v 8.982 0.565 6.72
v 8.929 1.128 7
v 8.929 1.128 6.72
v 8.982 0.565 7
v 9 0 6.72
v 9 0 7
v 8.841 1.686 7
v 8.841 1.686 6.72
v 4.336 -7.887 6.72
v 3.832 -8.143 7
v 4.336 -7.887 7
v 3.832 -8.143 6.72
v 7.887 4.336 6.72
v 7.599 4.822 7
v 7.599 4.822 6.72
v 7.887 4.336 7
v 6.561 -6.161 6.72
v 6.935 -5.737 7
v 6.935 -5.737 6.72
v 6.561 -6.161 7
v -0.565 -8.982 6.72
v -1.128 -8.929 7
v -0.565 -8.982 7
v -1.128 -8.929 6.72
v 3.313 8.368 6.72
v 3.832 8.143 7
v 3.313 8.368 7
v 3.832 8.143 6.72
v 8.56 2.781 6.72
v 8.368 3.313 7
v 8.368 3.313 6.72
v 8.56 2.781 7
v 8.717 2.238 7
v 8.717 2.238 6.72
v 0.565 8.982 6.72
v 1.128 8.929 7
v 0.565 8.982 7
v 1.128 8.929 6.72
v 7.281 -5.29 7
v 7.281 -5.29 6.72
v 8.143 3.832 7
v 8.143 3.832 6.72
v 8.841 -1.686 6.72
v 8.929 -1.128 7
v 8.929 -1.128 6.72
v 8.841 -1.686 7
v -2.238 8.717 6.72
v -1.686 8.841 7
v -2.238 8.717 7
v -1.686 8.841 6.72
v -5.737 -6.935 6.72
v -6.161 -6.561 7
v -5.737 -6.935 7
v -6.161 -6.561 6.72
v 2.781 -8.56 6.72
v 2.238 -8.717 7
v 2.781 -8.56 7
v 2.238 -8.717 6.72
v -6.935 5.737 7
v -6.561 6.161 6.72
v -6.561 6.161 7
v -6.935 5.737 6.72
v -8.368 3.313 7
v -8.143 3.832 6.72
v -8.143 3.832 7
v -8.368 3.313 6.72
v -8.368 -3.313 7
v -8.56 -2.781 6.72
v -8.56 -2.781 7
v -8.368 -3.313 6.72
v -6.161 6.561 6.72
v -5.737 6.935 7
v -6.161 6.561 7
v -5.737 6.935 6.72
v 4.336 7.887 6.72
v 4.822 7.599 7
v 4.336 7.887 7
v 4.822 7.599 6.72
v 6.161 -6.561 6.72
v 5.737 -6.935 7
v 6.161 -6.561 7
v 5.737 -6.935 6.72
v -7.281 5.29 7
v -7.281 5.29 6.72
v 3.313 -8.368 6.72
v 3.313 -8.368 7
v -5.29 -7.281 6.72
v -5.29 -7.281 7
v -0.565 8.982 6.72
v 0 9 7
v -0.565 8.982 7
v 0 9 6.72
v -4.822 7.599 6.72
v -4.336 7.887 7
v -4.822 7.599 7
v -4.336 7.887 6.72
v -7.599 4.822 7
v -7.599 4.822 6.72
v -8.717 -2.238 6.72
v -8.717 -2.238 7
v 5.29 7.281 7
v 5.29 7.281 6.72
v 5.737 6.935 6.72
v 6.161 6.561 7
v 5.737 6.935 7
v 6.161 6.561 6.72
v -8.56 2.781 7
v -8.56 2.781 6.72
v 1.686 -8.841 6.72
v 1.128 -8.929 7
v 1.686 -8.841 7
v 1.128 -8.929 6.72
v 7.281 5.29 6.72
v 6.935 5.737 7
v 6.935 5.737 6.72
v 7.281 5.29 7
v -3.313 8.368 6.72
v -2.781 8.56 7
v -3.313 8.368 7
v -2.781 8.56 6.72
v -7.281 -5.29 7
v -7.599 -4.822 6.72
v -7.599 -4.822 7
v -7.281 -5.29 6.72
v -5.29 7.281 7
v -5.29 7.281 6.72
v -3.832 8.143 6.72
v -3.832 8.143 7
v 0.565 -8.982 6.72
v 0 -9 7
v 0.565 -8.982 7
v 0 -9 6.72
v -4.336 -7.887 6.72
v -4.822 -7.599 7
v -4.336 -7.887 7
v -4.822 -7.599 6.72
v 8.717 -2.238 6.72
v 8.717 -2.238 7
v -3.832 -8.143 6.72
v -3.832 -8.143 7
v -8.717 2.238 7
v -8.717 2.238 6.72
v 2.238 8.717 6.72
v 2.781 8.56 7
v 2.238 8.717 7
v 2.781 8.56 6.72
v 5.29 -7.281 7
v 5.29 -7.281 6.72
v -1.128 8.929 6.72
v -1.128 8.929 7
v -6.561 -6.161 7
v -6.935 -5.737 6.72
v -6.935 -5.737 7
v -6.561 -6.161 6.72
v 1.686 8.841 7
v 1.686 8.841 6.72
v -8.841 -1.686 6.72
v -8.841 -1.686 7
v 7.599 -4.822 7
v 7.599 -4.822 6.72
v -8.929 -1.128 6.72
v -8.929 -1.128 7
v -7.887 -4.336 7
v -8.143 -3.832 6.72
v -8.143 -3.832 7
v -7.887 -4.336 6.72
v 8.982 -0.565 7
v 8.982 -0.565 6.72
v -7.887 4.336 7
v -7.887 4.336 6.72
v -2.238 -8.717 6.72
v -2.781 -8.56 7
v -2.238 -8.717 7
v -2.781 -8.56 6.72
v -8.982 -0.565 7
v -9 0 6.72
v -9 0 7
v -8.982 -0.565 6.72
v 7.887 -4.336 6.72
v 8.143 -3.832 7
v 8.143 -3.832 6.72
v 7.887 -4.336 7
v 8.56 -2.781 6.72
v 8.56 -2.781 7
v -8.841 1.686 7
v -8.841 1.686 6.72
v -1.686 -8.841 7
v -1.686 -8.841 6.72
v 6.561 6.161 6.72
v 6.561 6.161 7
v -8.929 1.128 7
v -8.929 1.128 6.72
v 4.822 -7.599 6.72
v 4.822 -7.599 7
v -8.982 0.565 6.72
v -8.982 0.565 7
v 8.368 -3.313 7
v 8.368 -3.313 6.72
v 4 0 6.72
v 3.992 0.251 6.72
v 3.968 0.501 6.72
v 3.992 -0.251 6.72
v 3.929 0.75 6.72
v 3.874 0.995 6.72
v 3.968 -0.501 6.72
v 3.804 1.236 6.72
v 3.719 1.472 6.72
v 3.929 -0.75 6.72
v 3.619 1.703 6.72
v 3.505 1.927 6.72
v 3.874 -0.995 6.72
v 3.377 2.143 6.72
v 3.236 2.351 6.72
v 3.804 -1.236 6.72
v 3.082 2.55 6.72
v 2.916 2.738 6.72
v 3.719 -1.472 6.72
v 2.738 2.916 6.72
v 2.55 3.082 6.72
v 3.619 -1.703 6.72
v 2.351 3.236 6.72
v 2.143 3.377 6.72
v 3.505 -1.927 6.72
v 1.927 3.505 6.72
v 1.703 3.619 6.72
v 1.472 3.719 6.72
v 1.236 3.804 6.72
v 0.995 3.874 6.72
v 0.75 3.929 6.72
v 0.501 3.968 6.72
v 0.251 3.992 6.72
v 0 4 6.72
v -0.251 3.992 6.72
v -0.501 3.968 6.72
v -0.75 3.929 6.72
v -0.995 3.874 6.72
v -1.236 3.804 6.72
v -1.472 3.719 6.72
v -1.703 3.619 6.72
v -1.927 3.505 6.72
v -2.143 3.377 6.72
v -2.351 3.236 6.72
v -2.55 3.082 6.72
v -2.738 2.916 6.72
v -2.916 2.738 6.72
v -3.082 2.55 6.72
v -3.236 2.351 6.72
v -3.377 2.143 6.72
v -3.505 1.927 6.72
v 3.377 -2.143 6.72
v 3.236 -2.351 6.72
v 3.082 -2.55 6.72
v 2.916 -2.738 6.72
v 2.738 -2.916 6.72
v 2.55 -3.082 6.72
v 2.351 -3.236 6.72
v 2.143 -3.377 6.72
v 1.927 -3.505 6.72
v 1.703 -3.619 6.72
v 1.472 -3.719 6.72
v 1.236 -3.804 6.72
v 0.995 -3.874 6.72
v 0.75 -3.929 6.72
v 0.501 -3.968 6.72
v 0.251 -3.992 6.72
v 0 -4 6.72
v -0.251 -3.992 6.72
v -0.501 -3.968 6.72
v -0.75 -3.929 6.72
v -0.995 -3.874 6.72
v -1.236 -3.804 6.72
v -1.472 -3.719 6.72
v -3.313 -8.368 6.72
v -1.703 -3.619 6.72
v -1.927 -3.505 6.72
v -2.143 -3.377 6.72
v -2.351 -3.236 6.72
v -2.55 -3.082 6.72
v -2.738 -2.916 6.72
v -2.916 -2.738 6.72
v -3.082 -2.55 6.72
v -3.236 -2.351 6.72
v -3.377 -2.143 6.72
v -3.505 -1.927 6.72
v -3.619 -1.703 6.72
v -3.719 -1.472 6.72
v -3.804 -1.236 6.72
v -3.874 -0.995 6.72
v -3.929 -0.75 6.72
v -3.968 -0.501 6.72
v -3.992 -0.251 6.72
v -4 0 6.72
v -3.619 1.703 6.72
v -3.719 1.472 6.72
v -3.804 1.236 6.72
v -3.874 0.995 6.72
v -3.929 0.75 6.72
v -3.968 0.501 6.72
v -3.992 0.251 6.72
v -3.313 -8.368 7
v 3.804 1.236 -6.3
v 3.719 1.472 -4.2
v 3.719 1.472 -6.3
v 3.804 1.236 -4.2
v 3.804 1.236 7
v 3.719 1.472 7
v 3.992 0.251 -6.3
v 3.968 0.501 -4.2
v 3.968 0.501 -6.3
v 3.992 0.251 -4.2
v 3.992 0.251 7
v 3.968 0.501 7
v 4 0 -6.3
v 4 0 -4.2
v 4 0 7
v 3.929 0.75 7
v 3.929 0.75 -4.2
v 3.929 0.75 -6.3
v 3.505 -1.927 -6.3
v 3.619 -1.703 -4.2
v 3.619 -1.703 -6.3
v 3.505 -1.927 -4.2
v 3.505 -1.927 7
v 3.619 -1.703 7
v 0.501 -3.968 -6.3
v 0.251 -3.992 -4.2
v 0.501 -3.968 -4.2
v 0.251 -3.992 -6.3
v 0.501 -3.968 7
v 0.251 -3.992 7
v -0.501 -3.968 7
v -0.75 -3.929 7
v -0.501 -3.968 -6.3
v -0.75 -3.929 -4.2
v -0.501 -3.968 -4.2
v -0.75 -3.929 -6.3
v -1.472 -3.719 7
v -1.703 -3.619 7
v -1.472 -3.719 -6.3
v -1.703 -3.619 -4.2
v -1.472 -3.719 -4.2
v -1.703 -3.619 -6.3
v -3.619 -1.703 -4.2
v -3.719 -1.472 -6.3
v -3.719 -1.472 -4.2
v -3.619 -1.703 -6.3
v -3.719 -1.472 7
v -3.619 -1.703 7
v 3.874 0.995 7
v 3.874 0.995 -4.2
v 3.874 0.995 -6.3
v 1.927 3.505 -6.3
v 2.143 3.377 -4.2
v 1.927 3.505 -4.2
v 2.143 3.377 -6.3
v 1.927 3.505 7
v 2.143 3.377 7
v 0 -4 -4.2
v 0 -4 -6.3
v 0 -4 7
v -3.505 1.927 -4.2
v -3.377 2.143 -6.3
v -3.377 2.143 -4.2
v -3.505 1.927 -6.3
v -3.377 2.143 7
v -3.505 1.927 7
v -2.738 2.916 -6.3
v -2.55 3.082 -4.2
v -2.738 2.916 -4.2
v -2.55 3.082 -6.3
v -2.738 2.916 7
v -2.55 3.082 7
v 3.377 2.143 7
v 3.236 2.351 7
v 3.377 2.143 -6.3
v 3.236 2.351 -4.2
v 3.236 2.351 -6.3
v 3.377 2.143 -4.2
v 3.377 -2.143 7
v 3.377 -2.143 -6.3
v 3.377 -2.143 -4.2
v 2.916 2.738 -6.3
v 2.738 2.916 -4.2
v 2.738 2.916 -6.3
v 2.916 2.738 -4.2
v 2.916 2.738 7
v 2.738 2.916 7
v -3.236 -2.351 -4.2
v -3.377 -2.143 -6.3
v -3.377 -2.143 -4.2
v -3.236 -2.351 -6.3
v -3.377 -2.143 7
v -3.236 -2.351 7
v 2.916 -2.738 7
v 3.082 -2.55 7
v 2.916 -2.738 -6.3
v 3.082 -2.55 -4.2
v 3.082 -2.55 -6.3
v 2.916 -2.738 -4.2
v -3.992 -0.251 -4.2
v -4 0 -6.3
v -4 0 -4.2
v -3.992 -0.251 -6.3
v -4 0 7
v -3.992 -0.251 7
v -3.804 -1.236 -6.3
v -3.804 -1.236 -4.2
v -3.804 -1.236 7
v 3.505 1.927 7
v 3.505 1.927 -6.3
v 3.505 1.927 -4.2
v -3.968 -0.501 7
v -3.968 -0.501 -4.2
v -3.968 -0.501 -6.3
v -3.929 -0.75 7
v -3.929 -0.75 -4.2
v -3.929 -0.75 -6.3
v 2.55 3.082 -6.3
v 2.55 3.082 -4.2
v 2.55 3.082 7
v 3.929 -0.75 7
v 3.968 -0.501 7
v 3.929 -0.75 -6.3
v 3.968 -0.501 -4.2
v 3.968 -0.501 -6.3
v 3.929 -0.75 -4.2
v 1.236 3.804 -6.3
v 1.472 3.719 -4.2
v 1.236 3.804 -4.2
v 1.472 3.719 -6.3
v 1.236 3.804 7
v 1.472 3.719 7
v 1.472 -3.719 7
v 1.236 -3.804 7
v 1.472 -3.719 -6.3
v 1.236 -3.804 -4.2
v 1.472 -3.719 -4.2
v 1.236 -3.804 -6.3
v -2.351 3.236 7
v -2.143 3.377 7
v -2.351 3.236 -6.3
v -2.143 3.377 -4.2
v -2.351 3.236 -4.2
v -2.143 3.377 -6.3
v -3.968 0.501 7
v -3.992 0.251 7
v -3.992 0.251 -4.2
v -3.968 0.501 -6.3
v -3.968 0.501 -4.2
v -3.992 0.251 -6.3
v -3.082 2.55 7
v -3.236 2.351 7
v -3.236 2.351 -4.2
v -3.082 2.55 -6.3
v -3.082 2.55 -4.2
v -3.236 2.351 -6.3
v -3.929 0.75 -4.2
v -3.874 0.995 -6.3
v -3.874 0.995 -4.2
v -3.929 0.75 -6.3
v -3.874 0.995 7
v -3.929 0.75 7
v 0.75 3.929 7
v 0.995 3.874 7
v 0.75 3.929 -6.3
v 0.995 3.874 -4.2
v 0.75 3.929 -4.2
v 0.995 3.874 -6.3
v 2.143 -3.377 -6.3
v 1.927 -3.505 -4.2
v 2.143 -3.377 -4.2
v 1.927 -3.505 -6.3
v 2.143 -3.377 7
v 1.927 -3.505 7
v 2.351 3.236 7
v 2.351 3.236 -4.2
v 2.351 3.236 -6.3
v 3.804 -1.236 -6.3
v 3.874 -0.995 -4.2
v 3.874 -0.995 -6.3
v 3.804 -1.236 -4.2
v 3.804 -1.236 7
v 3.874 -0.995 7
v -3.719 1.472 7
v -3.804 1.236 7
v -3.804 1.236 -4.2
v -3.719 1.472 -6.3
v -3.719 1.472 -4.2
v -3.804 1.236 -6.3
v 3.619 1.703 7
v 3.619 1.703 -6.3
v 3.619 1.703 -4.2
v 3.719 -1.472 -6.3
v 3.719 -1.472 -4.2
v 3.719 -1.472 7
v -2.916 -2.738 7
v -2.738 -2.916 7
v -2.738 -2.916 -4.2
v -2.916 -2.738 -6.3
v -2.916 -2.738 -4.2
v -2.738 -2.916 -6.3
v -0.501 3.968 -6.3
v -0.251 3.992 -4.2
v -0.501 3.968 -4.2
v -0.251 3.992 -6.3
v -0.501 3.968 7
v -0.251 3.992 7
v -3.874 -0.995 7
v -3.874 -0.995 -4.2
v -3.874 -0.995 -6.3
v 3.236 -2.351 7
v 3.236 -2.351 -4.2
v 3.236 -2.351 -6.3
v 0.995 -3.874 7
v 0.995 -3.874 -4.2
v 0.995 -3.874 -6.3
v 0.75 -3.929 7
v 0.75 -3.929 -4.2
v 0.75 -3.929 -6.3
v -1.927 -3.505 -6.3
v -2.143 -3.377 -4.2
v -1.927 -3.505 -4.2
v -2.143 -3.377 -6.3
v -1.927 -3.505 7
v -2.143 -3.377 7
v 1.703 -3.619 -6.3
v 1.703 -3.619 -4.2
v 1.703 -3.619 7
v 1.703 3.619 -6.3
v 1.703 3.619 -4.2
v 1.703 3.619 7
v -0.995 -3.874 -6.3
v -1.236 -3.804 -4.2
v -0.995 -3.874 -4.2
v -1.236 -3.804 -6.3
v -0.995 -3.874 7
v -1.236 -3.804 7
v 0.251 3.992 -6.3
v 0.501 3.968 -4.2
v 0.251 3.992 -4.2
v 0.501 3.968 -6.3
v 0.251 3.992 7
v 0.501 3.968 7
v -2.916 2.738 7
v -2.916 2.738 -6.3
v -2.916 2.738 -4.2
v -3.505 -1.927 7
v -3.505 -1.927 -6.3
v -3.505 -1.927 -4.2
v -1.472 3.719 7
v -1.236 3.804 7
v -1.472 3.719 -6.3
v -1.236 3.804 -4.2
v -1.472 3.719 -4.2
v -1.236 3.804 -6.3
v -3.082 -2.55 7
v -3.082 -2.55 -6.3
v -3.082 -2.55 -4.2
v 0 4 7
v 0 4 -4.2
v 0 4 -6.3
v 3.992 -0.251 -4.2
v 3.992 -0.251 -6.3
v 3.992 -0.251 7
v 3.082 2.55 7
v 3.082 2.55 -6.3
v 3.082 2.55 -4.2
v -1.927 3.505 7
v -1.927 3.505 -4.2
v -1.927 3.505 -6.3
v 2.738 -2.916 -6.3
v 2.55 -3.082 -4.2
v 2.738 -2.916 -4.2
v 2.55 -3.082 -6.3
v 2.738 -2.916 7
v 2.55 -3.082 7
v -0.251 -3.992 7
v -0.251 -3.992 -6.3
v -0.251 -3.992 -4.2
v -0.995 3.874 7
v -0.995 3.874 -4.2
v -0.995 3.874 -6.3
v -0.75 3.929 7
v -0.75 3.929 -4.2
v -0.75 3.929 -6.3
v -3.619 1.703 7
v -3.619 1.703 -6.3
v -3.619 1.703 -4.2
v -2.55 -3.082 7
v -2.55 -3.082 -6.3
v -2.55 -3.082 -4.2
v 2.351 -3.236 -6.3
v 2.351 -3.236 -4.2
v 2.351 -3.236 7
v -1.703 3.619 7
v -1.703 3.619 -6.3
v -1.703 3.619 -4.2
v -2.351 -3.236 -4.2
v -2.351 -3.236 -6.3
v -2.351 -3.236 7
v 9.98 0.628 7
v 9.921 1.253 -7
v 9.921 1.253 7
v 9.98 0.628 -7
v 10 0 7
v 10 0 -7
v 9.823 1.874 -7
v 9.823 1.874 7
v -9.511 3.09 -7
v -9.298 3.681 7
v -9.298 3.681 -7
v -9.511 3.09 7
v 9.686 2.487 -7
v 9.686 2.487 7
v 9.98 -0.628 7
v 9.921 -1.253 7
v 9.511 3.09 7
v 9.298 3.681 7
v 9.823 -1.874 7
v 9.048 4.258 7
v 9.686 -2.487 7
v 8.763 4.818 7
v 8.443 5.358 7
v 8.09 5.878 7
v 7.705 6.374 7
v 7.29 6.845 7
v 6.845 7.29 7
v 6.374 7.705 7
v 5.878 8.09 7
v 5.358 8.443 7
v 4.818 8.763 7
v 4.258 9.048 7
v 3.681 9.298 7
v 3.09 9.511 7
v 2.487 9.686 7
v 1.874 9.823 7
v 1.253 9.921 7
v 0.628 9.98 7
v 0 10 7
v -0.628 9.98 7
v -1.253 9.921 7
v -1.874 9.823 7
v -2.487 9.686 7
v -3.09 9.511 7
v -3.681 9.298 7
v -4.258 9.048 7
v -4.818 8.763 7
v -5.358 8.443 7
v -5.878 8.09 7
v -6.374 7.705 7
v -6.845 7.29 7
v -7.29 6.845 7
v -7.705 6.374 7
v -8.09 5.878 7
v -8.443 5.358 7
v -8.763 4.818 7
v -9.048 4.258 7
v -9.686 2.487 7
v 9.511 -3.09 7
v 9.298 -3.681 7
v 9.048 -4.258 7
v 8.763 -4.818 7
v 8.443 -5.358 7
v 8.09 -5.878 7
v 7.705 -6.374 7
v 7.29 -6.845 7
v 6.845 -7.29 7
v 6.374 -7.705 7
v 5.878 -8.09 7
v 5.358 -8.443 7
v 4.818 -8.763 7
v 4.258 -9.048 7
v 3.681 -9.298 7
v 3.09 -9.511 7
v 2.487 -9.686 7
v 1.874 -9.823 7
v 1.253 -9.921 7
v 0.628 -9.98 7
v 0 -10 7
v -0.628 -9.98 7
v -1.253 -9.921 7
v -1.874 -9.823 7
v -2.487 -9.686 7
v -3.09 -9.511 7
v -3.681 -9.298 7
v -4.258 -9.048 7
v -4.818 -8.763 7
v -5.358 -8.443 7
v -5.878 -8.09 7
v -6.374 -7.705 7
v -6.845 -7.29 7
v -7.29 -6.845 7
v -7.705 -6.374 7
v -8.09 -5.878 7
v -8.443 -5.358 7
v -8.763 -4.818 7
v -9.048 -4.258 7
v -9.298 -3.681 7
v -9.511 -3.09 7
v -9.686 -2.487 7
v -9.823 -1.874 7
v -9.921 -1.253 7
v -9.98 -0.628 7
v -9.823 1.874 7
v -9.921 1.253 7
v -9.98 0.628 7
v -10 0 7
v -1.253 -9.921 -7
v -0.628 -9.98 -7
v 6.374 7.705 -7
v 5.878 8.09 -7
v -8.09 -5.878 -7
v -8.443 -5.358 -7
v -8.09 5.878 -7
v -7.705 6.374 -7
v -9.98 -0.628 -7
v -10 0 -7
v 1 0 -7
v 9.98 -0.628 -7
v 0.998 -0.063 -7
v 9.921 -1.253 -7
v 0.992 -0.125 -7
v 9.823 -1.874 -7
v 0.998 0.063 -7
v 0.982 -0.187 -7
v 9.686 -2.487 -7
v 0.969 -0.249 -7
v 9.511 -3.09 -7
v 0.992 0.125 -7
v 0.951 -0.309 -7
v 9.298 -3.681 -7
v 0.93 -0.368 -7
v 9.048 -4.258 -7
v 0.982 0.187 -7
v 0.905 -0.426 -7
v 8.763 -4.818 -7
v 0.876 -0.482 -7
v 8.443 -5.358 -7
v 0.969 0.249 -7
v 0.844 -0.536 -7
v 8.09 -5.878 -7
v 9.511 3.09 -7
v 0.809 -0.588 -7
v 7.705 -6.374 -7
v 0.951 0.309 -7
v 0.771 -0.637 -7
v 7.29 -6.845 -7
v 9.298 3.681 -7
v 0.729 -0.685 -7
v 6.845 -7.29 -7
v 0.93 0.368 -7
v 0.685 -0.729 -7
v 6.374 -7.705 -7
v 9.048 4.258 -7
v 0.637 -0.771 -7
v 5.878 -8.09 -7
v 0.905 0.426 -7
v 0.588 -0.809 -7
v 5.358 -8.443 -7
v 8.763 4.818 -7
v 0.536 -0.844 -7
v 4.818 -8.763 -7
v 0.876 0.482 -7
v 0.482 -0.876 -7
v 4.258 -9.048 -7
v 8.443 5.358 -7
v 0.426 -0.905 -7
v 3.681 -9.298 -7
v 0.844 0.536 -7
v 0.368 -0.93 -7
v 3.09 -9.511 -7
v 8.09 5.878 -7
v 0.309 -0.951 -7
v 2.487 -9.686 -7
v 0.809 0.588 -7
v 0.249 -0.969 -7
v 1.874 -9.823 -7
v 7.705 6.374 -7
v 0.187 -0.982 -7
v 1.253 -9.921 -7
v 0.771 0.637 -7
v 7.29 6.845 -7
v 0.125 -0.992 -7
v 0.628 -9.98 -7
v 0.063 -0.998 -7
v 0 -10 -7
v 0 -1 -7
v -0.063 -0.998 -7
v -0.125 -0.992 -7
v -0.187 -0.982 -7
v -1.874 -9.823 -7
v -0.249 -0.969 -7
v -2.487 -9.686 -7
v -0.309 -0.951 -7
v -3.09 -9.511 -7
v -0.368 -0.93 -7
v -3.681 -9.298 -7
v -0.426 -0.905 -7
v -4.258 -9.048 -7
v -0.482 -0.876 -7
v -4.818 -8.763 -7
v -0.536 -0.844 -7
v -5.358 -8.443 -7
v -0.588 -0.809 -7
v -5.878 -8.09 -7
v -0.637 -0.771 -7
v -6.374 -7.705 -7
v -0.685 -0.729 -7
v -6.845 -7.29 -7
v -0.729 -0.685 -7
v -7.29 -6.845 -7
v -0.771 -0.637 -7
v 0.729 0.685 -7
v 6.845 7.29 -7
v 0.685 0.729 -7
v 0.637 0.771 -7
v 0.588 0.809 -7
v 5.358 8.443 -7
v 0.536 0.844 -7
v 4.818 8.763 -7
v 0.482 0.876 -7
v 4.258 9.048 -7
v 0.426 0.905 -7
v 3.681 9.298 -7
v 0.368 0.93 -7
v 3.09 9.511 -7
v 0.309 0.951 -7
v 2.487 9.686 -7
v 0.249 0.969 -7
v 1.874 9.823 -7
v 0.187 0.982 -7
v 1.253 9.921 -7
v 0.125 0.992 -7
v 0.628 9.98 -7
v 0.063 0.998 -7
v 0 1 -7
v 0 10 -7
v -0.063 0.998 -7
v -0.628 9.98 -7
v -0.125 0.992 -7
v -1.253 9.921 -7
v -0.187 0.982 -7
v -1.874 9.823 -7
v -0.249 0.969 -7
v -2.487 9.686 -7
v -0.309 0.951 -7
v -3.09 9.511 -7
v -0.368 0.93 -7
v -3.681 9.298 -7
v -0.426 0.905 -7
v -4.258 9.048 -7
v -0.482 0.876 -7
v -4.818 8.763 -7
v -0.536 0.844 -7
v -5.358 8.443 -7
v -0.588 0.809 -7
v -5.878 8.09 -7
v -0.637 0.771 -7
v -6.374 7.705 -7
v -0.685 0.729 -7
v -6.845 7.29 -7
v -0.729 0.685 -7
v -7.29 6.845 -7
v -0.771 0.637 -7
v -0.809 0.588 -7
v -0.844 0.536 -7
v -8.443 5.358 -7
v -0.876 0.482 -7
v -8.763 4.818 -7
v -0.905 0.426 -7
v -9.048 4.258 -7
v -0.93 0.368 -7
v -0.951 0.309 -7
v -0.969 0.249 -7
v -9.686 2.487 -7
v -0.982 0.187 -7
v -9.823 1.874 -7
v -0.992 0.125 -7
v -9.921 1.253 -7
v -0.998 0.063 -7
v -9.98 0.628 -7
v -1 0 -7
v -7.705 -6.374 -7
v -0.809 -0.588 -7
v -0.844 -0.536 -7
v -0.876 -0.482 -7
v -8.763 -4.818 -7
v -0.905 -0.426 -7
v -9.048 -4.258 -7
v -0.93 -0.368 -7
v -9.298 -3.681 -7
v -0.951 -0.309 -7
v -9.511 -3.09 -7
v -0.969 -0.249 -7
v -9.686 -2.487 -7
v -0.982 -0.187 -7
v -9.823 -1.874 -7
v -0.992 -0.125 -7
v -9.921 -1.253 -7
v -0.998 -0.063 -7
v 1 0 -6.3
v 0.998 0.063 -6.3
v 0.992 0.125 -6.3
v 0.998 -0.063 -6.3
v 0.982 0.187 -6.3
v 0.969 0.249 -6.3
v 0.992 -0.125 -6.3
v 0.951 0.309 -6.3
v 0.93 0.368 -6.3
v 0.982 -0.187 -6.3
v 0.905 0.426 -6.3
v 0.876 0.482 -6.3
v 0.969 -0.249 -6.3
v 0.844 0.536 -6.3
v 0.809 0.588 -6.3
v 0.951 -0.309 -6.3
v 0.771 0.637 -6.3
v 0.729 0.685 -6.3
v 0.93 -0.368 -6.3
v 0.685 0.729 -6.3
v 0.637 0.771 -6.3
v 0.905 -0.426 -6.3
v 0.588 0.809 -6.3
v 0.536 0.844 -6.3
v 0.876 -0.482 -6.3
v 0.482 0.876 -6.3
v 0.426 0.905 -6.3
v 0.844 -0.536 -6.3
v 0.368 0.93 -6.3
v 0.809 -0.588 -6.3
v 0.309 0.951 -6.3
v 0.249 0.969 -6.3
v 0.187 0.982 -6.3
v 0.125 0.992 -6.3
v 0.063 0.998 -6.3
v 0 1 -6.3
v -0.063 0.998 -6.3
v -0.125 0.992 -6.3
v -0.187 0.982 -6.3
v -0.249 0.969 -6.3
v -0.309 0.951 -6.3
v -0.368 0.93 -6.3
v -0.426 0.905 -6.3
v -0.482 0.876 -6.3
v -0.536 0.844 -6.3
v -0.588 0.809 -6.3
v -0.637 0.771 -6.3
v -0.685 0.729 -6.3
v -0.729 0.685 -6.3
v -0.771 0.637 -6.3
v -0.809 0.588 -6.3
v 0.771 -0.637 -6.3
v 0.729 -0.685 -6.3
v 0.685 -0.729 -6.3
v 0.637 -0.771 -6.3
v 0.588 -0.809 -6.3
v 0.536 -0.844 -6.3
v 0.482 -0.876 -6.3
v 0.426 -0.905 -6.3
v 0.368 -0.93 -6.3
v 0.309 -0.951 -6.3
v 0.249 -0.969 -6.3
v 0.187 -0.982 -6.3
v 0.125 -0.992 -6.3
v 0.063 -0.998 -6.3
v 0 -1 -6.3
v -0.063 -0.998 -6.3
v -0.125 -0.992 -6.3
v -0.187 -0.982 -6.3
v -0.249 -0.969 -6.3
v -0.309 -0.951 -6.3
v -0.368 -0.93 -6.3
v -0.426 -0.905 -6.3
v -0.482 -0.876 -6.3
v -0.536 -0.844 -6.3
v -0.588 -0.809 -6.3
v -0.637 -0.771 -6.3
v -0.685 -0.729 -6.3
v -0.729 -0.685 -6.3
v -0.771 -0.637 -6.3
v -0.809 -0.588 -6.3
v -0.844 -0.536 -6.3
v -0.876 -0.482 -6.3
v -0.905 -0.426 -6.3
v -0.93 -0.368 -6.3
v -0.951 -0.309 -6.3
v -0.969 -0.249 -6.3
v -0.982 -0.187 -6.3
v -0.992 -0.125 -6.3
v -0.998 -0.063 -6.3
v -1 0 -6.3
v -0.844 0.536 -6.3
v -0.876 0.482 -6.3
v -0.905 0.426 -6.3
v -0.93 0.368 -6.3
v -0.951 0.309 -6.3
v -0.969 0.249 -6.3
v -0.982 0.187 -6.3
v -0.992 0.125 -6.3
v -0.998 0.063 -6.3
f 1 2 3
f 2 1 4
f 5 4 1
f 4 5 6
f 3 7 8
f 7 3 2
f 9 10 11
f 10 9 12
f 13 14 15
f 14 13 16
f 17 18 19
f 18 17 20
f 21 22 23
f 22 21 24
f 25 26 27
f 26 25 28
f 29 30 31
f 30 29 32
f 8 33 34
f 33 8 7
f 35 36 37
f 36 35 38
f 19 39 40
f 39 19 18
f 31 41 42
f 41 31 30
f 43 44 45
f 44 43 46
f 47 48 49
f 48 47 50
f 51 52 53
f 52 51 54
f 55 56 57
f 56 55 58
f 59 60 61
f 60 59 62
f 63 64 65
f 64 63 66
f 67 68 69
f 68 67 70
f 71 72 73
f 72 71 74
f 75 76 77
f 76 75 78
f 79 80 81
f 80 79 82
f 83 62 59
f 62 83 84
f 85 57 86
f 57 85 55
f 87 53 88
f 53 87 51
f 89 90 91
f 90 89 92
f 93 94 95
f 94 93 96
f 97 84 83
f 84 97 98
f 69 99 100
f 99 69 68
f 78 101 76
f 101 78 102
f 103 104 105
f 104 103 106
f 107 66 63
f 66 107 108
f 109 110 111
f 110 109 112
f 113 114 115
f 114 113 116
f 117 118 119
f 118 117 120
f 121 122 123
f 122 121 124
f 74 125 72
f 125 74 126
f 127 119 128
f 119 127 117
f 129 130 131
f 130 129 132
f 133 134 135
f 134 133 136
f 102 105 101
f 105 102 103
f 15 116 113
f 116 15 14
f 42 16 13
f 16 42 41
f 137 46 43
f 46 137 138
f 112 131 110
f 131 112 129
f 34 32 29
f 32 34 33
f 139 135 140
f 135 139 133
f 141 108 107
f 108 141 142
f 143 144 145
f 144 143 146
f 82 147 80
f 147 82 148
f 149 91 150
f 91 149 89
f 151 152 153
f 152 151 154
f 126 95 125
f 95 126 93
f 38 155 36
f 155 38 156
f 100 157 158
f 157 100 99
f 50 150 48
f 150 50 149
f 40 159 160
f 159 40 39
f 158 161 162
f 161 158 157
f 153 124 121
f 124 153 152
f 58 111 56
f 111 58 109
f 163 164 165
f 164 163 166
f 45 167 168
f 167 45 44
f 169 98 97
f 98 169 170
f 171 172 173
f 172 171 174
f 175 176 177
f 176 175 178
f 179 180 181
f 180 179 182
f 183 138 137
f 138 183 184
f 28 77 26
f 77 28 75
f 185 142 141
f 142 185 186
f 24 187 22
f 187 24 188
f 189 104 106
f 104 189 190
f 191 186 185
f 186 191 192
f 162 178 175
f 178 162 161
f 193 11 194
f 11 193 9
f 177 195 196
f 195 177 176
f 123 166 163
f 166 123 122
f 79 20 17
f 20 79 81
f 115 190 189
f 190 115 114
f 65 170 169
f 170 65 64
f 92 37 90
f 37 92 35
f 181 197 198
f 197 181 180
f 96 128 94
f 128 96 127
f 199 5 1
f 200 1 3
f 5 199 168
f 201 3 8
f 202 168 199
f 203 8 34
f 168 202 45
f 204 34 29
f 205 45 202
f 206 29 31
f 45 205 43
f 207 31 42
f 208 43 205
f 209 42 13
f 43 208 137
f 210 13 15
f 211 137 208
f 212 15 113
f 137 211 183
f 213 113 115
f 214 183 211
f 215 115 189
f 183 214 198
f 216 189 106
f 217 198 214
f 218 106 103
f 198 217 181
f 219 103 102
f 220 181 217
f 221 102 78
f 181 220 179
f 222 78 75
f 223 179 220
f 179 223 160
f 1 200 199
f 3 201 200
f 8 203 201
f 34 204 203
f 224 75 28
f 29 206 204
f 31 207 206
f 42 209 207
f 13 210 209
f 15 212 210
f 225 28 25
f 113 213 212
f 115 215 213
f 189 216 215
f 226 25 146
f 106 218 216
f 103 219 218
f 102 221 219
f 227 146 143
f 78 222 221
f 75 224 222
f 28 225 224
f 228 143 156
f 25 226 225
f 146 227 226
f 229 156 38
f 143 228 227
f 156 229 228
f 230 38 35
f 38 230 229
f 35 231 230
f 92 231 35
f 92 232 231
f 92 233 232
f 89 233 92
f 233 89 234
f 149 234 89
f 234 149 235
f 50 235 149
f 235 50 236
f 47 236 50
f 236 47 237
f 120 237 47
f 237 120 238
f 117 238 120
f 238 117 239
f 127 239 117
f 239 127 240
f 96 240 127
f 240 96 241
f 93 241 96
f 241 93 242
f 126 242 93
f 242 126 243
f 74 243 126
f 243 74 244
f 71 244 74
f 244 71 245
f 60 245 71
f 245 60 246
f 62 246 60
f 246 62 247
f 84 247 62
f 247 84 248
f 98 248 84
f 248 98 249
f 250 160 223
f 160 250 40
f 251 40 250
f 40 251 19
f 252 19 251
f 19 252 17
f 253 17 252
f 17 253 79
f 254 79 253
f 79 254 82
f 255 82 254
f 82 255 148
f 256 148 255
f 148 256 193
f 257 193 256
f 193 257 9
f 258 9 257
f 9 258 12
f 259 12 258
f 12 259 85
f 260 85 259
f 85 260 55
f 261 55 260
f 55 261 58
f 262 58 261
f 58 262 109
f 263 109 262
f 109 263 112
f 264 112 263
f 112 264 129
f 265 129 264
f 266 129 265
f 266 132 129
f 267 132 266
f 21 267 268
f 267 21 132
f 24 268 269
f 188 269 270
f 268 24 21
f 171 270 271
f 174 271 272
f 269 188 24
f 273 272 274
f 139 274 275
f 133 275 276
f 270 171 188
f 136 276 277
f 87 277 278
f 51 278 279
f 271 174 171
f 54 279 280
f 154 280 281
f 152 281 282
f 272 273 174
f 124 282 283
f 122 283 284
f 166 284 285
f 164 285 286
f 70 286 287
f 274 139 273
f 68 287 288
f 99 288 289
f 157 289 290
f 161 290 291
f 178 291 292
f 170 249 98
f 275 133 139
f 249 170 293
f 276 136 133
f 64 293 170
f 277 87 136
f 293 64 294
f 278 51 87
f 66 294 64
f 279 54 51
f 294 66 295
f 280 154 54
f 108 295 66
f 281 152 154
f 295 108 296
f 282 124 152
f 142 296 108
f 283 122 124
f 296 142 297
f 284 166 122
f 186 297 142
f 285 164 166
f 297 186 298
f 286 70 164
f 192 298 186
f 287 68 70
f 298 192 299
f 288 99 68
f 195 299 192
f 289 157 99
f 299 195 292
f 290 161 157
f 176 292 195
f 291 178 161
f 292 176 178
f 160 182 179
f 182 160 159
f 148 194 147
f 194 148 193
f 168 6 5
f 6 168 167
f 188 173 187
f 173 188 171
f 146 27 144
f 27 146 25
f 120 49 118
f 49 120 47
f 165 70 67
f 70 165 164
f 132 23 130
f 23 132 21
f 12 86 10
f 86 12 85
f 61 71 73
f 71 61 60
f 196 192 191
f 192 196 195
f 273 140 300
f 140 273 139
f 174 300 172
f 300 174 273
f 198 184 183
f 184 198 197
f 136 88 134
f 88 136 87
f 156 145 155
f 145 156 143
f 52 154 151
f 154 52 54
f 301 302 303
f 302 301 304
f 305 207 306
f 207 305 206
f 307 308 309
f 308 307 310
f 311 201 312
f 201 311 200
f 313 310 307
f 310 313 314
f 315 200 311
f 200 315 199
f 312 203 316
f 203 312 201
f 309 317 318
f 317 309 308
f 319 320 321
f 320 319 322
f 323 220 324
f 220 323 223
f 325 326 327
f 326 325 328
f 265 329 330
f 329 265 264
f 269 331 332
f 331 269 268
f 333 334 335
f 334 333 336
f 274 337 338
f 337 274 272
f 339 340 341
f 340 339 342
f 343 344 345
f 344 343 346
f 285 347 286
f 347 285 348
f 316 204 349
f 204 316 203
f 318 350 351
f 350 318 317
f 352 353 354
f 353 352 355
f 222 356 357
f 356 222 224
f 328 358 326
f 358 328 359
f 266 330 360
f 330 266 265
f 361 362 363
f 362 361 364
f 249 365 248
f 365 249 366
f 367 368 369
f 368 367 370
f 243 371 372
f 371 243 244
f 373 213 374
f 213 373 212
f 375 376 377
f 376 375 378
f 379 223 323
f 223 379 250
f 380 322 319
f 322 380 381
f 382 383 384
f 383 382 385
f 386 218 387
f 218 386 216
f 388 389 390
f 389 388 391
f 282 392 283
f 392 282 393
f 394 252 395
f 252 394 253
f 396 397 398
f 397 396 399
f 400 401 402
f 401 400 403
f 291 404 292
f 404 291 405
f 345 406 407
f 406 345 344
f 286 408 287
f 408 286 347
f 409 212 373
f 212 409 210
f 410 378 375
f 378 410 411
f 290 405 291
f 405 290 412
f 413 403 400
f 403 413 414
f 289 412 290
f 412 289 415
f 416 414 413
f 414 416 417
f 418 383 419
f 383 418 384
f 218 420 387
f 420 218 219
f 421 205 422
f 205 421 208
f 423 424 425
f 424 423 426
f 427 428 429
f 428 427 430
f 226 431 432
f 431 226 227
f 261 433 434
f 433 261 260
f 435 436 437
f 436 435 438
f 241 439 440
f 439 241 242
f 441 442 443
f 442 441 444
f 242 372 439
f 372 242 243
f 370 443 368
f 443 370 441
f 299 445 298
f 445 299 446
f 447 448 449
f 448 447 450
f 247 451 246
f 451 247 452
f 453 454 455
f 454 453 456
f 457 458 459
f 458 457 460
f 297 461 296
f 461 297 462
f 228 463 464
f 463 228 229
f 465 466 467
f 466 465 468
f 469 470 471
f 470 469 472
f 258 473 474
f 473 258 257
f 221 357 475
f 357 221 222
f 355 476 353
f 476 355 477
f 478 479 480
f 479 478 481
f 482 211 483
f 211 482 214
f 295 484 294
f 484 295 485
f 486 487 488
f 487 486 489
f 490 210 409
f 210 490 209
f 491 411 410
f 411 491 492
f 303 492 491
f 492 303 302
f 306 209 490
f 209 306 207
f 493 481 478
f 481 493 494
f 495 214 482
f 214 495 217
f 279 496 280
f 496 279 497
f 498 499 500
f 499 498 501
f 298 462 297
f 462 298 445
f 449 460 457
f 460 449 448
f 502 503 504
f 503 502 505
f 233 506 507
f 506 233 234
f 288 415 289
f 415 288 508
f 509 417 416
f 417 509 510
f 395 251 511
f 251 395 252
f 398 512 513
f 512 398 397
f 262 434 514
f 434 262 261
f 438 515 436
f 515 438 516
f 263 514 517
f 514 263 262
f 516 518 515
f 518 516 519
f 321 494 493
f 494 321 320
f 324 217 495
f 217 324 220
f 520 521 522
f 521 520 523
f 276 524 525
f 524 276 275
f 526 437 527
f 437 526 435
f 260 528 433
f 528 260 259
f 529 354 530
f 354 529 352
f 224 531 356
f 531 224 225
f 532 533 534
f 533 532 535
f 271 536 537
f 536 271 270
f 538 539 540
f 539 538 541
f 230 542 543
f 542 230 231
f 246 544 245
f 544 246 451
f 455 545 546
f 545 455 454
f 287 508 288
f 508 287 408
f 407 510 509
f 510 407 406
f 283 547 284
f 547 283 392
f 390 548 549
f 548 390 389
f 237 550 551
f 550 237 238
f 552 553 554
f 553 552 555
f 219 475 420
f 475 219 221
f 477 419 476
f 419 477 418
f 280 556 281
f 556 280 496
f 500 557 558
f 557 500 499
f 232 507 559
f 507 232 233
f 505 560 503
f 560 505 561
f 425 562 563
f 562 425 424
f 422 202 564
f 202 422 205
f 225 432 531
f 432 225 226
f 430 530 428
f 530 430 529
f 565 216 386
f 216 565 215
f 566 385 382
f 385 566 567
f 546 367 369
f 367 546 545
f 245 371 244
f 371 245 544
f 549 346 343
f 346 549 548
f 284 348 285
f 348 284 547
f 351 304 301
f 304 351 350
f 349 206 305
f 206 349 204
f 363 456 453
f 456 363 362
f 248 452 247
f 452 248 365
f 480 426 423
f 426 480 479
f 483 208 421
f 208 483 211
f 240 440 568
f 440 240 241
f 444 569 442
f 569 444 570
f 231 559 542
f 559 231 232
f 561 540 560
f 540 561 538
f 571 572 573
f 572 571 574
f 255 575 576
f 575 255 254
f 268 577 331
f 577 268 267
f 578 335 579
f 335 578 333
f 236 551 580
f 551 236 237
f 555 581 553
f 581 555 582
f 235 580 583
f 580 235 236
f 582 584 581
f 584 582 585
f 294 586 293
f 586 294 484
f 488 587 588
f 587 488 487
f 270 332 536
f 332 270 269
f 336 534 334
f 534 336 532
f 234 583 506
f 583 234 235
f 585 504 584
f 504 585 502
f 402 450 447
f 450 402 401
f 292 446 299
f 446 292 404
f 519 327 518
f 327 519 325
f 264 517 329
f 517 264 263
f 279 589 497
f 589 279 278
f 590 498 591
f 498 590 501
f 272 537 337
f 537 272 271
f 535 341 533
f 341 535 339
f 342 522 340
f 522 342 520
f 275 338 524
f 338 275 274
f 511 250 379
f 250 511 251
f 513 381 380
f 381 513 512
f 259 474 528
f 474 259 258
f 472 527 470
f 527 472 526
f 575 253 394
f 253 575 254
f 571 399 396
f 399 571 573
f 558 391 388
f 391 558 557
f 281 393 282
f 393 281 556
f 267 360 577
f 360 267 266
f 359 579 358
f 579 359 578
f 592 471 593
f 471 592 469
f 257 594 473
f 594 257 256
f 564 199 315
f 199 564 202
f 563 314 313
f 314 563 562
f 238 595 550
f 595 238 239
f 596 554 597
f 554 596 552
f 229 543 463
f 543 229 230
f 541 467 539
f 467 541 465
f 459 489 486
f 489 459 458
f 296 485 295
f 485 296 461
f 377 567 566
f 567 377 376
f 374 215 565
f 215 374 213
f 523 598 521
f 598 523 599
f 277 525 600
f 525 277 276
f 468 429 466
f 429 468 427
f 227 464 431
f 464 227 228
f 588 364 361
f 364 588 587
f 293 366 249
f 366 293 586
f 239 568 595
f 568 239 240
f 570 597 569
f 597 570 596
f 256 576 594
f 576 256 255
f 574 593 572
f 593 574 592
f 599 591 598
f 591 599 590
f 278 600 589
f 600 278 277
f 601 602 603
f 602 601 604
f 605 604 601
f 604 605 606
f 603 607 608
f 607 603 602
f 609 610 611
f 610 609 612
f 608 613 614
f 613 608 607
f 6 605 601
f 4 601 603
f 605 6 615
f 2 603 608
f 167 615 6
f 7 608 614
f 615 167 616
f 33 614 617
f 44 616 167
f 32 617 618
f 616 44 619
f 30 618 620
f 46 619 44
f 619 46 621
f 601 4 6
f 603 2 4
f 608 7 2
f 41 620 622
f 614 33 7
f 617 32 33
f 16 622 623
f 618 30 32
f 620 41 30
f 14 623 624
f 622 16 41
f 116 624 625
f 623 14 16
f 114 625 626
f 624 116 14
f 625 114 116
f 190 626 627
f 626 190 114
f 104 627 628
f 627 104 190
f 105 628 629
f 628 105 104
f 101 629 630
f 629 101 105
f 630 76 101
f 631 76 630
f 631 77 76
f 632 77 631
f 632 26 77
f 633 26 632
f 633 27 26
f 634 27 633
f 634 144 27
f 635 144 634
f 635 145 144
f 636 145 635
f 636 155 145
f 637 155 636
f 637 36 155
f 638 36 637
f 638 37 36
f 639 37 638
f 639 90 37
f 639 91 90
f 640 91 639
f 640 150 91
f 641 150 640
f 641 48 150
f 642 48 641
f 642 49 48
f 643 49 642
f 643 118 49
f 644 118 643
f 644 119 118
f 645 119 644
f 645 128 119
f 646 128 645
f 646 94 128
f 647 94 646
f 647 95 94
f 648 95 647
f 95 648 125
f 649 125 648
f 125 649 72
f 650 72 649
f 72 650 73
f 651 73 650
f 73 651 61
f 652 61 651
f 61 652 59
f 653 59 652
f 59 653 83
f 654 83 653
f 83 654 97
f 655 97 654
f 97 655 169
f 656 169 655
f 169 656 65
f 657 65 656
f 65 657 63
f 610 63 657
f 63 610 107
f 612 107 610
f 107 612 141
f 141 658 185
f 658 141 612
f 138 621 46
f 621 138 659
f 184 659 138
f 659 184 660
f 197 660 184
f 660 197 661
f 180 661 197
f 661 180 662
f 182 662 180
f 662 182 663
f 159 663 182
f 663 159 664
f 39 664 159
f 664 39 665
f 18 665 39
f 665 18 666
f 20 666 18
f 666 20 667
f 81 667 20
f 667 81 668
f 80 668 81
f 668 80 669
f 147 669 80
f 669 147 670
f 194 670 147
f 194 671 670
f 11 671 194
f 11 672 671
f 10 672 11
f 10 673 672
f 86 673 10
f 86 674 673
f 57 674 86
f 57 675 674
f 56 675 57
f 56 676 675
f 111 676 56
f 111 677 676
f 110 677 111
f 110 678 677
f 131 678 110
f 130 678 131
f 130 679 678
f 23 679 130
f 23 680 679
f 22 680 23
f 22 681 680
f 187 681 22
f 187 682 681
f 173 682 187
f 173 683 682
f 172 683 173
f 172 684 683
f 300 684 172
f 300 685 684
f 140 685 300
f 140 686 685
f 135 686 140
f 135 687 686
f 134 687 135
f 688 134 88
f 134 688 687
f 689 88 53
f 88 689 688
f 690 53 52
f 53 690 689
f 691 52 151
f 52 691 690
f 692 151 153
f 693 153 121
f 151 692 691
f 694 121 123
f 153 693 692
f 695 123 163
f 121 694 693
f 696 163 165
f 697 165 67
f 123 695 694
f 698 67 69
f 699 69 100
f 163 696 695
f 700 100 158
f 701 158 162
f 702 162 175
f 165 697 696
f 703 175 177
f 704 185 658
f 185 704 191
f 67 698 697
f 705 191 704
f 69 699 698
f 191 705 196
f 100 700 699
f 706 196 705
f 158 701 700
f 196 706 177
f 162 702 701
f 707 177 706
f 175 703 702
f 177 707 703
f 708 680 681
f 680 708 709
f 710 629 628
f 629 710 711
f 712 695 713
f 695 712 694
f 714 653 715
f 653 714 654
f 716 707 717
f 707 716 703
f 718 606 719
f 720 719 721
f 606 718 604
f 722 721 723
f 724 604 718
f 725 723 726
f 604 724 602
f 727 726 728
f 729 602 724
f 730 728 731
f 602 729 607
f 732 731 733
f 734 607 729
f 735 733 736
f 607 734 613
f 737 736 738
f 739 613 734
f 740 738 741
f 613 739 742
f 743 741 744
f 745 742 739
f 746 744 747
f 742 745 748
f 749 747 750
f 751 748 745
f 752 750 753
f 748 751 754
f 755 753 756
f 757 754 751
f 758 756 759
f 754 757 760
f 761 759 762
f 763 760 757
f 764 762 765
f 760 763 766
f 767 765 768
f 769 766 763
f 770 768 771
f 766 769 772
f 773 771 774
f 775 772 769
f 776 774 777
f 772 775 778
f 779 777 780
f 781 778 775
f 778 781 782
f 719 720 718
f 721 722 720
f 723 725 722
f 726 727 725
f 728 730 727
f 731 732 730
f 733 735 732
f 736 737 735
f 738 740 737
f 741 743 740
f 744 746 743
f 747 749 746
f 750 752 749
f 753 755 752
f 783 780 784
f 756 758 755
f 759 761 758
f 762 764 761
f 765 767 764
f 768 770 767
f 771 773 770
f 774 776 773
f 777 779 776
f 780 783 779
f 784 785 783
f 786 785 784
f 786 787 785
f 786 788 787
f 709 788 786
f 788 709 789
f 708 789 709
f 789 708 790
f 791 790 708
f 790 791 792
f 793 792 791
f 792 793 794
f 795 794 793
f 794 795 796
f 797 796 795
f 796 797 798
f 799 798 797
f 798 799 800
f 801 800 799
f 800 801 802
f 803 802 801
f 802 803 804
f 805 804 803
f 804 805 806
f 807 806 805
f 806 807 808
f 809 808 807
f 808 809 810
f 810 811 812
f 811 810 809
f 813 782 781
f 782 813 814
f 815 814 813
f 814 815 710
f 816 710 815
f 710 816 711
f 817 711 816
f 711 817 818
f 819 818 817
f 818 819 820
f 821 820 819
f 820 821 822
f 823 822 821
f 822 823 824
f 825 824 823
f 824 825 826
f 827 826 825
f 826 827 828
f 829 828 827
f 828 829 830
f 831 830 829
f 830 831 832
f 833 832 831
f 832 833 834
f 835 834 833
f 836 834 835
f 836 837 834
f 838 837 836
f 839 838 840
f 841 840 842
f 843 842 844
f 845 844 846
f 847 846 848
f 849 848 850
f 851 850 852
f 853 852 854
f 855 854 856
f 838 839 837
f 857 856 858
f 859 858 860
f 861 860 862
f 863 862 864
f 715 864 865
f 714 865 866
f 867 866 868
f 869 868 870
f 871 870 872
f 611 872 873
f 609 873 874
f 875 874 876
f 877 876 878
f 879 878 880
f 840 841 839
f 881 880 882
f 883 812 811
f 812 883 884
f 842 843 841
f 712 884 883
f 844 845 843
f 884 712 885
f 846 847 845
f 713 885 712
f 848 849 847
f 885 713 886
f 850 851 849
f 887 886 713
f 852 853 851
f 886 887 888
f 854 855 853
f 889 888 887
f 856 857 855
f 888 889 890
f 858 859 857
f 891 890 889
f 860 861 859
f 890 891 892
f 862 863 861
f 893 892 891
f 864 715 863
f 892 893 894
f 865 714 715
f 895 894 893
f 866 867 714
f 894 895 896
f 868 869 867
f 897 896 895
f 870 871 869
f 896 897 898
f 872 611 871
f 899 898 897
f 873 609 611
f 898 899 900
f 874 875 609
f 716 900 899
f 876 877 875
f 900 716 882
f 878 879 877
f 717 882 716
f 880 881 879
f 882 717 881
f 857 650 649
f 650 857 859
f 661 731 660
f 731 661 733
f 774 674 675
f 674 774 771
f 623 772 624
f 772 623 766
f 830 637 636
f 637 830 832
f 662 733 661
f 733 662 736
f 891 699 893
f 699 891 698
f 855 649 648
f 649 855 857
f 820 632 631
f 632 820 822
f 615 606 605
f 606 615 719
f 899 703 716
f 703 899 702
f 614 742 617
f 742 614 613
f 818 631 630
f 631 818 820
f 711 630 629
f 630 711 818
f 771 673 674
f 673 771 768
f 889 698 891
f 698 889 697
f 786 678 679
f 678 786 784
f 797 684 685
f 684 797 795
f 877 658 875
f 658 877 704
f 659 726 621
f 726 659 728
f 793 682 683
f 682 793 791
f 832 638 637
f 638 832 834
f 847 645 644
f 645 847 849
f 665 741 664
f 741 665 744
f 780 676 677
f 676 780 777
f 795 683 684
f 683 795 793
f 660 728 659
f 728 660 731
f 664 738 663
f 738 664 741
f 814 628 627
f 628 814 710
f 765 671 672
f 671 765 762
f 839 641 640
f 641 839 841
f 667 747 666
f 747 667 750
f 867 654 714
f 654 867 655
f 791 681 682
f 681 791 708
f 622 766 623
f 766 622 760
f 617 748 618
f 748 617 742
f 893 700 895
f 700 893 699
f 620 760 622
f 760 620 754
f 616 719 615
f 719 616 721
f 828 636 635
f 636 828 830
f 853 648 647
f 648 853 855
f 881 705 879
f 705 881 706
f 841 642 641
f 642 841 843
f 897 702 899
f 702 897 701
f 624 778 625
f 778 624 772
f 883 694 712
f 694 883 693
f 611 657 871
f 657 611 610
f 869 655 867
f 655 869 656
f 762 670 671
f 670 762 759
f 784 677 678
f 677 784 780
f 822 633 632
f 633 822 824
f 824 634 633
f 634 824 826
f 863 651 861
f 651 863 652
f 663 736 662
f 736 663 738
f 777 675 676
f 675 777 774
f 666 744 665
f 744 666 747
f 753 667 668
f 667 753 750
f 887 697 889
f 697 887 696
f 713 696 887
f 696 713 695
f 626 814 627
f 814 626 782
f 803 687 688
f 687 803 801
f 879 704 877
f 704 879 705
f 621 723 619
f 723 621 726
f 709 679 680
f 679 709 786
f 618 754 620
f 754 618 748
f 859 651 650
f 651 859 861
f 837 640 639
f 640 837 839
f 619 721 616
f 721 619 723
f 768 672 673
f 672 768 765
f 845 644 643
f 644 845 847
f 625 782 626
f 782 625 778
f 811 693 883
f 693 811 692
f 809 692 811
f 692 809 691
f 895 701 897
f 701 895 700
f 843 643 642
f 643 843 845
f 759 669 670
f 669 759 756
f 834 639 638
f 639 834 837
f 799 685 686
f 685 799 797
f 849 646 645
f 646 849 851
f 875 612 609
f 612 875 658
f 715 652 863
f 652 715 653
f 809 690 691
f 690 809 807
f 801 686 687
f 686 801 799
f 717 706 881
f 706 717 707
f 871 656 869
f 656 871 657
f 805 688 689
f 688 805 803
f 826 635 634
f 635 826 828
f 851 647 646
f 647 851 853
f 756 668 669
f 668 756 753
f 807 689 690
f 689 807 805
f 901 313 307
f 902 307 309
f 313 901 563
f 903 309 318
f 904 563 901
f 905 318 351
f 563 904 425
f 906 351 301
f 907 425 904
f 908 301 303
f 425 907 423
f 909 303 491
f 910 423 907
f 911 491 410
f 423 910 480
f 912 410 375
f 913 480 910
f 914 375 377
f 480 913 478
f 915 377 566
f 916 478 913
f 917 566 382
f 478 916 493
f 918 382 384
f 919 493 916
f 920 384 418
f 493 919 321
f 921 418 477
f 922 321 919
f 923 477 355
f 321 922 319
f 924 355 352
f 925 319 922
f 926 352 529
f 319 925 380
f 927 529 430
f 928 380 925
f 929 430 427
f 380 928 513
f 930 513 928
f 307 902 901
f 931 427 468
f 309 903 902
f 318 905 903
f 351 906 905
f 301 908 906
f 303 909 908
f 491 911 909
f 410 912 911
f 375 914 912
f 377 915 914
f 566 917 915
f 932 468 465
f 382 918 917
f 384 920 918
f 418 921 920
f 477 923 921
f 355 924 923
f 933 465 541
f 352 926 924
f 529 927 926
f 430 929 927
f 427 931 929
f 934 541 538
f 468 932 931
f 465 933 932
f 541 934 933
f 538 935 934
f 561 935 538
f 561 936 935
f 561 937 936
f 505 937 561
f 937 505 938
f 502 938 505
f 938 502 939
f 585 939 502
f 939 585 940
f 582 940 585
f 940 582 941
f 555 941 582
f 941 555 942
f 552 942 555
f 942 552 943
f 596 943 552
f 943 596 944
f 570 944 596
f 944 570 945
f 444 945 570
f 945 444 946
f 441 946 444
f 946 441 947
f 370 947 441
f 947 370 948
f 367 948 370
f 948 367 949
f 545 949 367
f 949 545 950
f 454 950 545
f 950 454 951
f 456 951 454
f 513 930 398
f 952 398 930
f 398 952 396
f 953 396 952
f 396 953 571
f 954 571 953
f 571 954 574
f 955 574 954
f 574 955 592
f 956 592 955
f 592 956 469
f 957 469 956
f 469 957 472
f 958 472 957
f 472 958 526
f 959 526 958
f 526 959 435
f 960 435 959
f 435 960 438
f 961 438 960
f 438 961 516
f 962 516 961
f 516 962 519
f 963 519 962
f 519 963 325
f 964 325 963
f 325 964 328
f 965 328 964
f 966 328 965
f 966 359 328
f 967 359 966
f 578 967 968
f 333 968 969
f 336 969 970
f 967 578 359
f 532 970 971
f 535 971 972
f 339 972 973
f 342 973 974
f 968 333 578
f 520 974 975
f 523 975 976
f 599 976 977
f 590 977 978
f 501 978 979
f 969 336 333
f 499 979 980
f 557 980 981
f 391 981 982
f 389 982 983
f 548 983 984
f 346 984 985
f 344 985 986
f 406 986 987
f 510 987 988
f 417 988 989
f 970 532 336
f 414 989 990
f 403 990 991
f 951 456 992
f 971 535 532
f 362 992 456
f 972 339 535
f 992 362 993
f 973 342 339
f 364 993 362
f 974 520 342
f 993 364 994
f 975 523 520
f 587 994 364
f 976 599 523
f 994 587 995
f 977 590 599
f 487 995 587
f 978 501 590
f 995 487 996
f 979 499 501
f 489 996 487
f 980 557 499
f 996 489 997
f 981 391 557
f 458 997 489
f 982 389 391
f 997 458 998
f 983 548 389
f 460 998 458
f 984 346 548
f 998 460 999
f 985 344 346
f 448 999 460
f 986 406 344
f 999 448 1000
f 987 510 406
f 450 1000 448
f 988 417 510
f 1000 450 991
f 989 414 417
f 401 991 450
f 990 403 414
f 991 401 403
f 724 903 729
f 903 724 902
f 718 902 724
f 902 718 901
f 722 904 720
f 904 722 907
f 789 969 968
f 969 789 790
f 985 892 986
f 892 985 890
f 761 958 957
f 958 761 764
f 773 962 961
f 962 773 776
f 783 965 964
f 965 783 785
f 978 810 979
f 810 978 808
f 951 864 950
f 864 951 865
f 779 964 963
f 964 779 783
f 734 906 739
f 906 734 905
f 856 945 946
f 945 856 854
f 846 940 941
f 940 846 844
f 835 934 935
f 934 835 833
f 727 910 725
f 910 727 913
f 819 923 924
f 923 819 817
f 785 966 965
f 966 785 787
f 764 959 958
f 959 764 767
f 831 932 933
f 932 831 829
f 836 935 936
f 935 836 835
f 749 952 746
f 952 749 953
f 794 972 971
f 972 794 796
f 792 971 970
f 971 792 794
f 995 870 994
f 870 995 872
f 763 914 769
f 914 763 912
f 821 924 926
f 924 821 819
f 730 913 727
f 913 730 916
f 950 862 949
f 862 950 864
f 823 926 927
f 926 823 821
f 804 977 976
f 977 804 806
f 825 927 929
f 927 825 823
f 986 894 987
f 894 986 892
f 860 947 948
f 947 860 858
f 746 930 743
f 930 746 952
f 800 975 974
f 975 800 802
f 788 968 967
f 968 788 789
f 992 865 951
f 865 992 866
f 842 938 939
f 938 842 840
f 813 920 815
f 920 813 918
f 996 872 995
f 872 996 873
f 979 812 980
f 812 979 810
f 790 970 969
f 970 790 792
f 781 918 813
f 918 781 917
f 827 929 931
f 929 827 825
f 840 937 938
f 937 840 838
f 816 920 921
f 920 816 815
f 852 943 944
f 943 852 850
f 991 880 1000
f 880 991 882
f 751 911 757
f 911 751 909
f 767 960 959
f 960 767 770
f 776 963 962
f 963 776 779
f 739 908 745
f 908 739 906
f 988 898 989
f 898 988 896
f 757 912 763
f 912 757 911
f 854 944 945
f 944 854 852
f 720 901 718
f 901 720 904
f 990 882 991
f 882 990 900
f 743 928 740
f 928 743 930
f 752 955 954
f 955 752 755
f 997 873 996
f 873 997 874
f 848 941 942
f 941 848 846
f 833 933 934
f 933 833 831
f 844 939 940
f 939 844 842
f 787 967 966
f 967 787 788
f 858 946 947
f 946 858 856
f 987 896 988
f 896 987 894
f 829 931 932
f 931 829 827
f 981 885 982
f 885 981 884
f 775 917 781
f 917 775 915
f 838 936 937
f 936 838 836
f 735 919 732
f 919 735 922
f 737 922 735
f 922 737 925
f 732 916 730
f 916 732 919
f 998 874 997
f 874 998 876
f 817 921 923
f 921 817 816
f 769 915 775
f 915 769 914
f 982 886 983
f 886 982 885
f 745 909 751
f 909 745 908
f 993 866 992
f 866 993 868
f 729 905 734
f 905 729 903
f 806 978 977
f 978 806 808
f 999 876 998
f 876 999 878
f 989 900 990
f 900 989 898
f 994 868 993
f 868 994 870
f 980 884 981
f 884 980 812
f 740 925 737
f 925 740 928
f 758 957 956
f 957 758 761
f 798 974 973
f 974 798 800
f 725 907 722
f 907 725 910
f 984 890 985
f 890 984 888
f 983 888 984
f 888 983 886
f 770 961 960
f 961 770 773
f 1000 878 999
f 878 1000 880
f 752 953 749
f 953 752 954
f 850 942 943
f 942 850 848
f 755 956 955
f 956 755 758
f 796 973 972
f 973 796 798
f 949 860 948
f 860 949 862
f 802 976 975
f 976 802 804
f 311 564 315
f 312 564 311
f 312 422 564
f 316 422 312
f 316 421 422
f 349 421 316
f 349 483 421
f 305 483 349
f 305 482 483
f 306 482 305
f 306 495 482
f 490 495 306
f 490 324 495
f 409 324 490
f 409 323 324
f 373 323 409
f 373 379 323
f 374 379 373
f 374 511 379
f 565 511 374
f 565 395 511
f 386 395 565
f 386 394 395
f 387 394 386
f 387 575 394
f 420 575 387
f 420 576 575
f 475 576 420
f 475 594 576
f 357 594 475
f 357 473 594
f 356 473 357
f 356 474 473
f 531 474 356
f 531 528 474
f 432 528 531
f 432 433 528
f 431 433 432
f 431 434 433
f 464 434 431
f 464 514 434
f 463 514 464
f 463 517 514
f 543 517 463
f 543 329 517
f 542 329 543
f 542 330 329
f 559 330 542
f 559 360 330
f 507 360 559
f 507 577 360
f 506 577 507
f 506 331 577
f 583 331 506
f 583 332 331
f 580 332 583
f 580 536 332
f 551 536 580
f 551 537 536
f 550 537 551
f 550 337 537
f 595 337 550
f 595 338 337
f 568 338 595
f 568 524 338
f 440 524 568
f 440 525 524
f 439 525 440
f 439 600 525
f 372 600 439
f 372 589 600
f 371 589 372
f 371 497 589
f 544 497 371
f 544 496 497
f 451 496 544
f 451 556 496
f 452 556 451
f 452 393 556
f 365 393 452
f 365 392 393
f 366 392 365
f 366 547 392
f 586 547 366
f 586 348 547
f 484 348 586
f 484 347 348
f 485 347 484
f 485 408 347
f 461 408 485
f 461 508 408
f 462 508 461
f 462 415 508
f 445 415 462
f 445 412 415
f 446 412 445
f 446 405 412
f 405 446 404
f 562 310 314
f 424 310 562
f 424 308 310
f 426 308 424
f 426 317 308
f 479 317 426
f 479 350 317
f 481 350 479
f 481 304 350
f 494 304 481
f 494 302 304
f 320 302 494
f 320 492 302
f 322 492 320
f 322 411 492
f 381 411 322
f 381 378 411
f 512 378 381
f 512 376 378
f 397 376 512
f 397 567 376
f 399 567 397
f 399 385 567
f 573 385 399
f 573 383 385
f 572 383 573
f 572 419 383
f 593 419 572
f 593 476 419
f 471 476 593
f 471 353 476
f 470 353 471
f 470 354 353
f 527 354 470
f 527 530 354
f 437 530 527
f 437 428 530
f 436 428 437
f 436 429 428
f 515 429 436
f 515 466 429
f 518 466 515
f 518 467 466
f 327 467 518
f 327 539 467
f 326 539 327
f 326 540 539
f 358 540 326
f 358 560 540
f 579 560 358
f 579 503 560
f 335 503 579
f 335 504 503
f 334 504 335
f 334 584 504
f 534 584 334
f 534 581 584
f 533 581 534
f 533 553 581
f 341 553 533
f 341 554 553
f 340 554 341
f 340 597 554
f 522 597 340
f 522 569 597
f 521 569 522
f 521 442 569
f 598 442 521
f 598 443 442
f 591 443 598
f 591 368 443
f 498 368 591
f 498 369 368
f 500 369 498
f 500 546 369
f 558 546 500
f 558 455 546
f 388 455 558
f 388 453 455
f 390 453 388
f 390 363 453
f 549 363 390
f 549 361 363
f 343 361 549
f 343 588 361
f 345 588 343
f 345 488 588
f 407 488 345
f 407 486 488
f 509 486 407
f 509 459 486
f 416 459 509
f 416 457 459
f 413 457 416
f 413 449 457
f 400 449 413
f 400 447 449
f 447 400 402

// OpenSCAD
module ElectroMagnet(diameter, height) {
  $fn=100;

  // steel core
  color("silver") translate([0,0,0.1*height]) cylinder(h=0.8*height,d=0.4*diameter,center=true);
  // black wrapping
  difference() {
    color("black") cylinder(h=0.96*height,d=0.9*diameter,center=true);
    cylinder(h=1.02*height,d=0.4*diameter,center=true);
  }
  // steel shell
  difference() {
    // shell body
    color("silver") cylinder(h=1*height,d=1*diameter,center=true);
    // empty core
    translate([0,0,0.05*height]) cylinder(h=1*height,d=0.9*diameter,center=true);
    // bottom drilling
    translate([0,0,-0.46*height]) cylinder(h=0.1*height,d=0.1*diameter,center=true);
  }
}

ElectroMagnet(20,14);
